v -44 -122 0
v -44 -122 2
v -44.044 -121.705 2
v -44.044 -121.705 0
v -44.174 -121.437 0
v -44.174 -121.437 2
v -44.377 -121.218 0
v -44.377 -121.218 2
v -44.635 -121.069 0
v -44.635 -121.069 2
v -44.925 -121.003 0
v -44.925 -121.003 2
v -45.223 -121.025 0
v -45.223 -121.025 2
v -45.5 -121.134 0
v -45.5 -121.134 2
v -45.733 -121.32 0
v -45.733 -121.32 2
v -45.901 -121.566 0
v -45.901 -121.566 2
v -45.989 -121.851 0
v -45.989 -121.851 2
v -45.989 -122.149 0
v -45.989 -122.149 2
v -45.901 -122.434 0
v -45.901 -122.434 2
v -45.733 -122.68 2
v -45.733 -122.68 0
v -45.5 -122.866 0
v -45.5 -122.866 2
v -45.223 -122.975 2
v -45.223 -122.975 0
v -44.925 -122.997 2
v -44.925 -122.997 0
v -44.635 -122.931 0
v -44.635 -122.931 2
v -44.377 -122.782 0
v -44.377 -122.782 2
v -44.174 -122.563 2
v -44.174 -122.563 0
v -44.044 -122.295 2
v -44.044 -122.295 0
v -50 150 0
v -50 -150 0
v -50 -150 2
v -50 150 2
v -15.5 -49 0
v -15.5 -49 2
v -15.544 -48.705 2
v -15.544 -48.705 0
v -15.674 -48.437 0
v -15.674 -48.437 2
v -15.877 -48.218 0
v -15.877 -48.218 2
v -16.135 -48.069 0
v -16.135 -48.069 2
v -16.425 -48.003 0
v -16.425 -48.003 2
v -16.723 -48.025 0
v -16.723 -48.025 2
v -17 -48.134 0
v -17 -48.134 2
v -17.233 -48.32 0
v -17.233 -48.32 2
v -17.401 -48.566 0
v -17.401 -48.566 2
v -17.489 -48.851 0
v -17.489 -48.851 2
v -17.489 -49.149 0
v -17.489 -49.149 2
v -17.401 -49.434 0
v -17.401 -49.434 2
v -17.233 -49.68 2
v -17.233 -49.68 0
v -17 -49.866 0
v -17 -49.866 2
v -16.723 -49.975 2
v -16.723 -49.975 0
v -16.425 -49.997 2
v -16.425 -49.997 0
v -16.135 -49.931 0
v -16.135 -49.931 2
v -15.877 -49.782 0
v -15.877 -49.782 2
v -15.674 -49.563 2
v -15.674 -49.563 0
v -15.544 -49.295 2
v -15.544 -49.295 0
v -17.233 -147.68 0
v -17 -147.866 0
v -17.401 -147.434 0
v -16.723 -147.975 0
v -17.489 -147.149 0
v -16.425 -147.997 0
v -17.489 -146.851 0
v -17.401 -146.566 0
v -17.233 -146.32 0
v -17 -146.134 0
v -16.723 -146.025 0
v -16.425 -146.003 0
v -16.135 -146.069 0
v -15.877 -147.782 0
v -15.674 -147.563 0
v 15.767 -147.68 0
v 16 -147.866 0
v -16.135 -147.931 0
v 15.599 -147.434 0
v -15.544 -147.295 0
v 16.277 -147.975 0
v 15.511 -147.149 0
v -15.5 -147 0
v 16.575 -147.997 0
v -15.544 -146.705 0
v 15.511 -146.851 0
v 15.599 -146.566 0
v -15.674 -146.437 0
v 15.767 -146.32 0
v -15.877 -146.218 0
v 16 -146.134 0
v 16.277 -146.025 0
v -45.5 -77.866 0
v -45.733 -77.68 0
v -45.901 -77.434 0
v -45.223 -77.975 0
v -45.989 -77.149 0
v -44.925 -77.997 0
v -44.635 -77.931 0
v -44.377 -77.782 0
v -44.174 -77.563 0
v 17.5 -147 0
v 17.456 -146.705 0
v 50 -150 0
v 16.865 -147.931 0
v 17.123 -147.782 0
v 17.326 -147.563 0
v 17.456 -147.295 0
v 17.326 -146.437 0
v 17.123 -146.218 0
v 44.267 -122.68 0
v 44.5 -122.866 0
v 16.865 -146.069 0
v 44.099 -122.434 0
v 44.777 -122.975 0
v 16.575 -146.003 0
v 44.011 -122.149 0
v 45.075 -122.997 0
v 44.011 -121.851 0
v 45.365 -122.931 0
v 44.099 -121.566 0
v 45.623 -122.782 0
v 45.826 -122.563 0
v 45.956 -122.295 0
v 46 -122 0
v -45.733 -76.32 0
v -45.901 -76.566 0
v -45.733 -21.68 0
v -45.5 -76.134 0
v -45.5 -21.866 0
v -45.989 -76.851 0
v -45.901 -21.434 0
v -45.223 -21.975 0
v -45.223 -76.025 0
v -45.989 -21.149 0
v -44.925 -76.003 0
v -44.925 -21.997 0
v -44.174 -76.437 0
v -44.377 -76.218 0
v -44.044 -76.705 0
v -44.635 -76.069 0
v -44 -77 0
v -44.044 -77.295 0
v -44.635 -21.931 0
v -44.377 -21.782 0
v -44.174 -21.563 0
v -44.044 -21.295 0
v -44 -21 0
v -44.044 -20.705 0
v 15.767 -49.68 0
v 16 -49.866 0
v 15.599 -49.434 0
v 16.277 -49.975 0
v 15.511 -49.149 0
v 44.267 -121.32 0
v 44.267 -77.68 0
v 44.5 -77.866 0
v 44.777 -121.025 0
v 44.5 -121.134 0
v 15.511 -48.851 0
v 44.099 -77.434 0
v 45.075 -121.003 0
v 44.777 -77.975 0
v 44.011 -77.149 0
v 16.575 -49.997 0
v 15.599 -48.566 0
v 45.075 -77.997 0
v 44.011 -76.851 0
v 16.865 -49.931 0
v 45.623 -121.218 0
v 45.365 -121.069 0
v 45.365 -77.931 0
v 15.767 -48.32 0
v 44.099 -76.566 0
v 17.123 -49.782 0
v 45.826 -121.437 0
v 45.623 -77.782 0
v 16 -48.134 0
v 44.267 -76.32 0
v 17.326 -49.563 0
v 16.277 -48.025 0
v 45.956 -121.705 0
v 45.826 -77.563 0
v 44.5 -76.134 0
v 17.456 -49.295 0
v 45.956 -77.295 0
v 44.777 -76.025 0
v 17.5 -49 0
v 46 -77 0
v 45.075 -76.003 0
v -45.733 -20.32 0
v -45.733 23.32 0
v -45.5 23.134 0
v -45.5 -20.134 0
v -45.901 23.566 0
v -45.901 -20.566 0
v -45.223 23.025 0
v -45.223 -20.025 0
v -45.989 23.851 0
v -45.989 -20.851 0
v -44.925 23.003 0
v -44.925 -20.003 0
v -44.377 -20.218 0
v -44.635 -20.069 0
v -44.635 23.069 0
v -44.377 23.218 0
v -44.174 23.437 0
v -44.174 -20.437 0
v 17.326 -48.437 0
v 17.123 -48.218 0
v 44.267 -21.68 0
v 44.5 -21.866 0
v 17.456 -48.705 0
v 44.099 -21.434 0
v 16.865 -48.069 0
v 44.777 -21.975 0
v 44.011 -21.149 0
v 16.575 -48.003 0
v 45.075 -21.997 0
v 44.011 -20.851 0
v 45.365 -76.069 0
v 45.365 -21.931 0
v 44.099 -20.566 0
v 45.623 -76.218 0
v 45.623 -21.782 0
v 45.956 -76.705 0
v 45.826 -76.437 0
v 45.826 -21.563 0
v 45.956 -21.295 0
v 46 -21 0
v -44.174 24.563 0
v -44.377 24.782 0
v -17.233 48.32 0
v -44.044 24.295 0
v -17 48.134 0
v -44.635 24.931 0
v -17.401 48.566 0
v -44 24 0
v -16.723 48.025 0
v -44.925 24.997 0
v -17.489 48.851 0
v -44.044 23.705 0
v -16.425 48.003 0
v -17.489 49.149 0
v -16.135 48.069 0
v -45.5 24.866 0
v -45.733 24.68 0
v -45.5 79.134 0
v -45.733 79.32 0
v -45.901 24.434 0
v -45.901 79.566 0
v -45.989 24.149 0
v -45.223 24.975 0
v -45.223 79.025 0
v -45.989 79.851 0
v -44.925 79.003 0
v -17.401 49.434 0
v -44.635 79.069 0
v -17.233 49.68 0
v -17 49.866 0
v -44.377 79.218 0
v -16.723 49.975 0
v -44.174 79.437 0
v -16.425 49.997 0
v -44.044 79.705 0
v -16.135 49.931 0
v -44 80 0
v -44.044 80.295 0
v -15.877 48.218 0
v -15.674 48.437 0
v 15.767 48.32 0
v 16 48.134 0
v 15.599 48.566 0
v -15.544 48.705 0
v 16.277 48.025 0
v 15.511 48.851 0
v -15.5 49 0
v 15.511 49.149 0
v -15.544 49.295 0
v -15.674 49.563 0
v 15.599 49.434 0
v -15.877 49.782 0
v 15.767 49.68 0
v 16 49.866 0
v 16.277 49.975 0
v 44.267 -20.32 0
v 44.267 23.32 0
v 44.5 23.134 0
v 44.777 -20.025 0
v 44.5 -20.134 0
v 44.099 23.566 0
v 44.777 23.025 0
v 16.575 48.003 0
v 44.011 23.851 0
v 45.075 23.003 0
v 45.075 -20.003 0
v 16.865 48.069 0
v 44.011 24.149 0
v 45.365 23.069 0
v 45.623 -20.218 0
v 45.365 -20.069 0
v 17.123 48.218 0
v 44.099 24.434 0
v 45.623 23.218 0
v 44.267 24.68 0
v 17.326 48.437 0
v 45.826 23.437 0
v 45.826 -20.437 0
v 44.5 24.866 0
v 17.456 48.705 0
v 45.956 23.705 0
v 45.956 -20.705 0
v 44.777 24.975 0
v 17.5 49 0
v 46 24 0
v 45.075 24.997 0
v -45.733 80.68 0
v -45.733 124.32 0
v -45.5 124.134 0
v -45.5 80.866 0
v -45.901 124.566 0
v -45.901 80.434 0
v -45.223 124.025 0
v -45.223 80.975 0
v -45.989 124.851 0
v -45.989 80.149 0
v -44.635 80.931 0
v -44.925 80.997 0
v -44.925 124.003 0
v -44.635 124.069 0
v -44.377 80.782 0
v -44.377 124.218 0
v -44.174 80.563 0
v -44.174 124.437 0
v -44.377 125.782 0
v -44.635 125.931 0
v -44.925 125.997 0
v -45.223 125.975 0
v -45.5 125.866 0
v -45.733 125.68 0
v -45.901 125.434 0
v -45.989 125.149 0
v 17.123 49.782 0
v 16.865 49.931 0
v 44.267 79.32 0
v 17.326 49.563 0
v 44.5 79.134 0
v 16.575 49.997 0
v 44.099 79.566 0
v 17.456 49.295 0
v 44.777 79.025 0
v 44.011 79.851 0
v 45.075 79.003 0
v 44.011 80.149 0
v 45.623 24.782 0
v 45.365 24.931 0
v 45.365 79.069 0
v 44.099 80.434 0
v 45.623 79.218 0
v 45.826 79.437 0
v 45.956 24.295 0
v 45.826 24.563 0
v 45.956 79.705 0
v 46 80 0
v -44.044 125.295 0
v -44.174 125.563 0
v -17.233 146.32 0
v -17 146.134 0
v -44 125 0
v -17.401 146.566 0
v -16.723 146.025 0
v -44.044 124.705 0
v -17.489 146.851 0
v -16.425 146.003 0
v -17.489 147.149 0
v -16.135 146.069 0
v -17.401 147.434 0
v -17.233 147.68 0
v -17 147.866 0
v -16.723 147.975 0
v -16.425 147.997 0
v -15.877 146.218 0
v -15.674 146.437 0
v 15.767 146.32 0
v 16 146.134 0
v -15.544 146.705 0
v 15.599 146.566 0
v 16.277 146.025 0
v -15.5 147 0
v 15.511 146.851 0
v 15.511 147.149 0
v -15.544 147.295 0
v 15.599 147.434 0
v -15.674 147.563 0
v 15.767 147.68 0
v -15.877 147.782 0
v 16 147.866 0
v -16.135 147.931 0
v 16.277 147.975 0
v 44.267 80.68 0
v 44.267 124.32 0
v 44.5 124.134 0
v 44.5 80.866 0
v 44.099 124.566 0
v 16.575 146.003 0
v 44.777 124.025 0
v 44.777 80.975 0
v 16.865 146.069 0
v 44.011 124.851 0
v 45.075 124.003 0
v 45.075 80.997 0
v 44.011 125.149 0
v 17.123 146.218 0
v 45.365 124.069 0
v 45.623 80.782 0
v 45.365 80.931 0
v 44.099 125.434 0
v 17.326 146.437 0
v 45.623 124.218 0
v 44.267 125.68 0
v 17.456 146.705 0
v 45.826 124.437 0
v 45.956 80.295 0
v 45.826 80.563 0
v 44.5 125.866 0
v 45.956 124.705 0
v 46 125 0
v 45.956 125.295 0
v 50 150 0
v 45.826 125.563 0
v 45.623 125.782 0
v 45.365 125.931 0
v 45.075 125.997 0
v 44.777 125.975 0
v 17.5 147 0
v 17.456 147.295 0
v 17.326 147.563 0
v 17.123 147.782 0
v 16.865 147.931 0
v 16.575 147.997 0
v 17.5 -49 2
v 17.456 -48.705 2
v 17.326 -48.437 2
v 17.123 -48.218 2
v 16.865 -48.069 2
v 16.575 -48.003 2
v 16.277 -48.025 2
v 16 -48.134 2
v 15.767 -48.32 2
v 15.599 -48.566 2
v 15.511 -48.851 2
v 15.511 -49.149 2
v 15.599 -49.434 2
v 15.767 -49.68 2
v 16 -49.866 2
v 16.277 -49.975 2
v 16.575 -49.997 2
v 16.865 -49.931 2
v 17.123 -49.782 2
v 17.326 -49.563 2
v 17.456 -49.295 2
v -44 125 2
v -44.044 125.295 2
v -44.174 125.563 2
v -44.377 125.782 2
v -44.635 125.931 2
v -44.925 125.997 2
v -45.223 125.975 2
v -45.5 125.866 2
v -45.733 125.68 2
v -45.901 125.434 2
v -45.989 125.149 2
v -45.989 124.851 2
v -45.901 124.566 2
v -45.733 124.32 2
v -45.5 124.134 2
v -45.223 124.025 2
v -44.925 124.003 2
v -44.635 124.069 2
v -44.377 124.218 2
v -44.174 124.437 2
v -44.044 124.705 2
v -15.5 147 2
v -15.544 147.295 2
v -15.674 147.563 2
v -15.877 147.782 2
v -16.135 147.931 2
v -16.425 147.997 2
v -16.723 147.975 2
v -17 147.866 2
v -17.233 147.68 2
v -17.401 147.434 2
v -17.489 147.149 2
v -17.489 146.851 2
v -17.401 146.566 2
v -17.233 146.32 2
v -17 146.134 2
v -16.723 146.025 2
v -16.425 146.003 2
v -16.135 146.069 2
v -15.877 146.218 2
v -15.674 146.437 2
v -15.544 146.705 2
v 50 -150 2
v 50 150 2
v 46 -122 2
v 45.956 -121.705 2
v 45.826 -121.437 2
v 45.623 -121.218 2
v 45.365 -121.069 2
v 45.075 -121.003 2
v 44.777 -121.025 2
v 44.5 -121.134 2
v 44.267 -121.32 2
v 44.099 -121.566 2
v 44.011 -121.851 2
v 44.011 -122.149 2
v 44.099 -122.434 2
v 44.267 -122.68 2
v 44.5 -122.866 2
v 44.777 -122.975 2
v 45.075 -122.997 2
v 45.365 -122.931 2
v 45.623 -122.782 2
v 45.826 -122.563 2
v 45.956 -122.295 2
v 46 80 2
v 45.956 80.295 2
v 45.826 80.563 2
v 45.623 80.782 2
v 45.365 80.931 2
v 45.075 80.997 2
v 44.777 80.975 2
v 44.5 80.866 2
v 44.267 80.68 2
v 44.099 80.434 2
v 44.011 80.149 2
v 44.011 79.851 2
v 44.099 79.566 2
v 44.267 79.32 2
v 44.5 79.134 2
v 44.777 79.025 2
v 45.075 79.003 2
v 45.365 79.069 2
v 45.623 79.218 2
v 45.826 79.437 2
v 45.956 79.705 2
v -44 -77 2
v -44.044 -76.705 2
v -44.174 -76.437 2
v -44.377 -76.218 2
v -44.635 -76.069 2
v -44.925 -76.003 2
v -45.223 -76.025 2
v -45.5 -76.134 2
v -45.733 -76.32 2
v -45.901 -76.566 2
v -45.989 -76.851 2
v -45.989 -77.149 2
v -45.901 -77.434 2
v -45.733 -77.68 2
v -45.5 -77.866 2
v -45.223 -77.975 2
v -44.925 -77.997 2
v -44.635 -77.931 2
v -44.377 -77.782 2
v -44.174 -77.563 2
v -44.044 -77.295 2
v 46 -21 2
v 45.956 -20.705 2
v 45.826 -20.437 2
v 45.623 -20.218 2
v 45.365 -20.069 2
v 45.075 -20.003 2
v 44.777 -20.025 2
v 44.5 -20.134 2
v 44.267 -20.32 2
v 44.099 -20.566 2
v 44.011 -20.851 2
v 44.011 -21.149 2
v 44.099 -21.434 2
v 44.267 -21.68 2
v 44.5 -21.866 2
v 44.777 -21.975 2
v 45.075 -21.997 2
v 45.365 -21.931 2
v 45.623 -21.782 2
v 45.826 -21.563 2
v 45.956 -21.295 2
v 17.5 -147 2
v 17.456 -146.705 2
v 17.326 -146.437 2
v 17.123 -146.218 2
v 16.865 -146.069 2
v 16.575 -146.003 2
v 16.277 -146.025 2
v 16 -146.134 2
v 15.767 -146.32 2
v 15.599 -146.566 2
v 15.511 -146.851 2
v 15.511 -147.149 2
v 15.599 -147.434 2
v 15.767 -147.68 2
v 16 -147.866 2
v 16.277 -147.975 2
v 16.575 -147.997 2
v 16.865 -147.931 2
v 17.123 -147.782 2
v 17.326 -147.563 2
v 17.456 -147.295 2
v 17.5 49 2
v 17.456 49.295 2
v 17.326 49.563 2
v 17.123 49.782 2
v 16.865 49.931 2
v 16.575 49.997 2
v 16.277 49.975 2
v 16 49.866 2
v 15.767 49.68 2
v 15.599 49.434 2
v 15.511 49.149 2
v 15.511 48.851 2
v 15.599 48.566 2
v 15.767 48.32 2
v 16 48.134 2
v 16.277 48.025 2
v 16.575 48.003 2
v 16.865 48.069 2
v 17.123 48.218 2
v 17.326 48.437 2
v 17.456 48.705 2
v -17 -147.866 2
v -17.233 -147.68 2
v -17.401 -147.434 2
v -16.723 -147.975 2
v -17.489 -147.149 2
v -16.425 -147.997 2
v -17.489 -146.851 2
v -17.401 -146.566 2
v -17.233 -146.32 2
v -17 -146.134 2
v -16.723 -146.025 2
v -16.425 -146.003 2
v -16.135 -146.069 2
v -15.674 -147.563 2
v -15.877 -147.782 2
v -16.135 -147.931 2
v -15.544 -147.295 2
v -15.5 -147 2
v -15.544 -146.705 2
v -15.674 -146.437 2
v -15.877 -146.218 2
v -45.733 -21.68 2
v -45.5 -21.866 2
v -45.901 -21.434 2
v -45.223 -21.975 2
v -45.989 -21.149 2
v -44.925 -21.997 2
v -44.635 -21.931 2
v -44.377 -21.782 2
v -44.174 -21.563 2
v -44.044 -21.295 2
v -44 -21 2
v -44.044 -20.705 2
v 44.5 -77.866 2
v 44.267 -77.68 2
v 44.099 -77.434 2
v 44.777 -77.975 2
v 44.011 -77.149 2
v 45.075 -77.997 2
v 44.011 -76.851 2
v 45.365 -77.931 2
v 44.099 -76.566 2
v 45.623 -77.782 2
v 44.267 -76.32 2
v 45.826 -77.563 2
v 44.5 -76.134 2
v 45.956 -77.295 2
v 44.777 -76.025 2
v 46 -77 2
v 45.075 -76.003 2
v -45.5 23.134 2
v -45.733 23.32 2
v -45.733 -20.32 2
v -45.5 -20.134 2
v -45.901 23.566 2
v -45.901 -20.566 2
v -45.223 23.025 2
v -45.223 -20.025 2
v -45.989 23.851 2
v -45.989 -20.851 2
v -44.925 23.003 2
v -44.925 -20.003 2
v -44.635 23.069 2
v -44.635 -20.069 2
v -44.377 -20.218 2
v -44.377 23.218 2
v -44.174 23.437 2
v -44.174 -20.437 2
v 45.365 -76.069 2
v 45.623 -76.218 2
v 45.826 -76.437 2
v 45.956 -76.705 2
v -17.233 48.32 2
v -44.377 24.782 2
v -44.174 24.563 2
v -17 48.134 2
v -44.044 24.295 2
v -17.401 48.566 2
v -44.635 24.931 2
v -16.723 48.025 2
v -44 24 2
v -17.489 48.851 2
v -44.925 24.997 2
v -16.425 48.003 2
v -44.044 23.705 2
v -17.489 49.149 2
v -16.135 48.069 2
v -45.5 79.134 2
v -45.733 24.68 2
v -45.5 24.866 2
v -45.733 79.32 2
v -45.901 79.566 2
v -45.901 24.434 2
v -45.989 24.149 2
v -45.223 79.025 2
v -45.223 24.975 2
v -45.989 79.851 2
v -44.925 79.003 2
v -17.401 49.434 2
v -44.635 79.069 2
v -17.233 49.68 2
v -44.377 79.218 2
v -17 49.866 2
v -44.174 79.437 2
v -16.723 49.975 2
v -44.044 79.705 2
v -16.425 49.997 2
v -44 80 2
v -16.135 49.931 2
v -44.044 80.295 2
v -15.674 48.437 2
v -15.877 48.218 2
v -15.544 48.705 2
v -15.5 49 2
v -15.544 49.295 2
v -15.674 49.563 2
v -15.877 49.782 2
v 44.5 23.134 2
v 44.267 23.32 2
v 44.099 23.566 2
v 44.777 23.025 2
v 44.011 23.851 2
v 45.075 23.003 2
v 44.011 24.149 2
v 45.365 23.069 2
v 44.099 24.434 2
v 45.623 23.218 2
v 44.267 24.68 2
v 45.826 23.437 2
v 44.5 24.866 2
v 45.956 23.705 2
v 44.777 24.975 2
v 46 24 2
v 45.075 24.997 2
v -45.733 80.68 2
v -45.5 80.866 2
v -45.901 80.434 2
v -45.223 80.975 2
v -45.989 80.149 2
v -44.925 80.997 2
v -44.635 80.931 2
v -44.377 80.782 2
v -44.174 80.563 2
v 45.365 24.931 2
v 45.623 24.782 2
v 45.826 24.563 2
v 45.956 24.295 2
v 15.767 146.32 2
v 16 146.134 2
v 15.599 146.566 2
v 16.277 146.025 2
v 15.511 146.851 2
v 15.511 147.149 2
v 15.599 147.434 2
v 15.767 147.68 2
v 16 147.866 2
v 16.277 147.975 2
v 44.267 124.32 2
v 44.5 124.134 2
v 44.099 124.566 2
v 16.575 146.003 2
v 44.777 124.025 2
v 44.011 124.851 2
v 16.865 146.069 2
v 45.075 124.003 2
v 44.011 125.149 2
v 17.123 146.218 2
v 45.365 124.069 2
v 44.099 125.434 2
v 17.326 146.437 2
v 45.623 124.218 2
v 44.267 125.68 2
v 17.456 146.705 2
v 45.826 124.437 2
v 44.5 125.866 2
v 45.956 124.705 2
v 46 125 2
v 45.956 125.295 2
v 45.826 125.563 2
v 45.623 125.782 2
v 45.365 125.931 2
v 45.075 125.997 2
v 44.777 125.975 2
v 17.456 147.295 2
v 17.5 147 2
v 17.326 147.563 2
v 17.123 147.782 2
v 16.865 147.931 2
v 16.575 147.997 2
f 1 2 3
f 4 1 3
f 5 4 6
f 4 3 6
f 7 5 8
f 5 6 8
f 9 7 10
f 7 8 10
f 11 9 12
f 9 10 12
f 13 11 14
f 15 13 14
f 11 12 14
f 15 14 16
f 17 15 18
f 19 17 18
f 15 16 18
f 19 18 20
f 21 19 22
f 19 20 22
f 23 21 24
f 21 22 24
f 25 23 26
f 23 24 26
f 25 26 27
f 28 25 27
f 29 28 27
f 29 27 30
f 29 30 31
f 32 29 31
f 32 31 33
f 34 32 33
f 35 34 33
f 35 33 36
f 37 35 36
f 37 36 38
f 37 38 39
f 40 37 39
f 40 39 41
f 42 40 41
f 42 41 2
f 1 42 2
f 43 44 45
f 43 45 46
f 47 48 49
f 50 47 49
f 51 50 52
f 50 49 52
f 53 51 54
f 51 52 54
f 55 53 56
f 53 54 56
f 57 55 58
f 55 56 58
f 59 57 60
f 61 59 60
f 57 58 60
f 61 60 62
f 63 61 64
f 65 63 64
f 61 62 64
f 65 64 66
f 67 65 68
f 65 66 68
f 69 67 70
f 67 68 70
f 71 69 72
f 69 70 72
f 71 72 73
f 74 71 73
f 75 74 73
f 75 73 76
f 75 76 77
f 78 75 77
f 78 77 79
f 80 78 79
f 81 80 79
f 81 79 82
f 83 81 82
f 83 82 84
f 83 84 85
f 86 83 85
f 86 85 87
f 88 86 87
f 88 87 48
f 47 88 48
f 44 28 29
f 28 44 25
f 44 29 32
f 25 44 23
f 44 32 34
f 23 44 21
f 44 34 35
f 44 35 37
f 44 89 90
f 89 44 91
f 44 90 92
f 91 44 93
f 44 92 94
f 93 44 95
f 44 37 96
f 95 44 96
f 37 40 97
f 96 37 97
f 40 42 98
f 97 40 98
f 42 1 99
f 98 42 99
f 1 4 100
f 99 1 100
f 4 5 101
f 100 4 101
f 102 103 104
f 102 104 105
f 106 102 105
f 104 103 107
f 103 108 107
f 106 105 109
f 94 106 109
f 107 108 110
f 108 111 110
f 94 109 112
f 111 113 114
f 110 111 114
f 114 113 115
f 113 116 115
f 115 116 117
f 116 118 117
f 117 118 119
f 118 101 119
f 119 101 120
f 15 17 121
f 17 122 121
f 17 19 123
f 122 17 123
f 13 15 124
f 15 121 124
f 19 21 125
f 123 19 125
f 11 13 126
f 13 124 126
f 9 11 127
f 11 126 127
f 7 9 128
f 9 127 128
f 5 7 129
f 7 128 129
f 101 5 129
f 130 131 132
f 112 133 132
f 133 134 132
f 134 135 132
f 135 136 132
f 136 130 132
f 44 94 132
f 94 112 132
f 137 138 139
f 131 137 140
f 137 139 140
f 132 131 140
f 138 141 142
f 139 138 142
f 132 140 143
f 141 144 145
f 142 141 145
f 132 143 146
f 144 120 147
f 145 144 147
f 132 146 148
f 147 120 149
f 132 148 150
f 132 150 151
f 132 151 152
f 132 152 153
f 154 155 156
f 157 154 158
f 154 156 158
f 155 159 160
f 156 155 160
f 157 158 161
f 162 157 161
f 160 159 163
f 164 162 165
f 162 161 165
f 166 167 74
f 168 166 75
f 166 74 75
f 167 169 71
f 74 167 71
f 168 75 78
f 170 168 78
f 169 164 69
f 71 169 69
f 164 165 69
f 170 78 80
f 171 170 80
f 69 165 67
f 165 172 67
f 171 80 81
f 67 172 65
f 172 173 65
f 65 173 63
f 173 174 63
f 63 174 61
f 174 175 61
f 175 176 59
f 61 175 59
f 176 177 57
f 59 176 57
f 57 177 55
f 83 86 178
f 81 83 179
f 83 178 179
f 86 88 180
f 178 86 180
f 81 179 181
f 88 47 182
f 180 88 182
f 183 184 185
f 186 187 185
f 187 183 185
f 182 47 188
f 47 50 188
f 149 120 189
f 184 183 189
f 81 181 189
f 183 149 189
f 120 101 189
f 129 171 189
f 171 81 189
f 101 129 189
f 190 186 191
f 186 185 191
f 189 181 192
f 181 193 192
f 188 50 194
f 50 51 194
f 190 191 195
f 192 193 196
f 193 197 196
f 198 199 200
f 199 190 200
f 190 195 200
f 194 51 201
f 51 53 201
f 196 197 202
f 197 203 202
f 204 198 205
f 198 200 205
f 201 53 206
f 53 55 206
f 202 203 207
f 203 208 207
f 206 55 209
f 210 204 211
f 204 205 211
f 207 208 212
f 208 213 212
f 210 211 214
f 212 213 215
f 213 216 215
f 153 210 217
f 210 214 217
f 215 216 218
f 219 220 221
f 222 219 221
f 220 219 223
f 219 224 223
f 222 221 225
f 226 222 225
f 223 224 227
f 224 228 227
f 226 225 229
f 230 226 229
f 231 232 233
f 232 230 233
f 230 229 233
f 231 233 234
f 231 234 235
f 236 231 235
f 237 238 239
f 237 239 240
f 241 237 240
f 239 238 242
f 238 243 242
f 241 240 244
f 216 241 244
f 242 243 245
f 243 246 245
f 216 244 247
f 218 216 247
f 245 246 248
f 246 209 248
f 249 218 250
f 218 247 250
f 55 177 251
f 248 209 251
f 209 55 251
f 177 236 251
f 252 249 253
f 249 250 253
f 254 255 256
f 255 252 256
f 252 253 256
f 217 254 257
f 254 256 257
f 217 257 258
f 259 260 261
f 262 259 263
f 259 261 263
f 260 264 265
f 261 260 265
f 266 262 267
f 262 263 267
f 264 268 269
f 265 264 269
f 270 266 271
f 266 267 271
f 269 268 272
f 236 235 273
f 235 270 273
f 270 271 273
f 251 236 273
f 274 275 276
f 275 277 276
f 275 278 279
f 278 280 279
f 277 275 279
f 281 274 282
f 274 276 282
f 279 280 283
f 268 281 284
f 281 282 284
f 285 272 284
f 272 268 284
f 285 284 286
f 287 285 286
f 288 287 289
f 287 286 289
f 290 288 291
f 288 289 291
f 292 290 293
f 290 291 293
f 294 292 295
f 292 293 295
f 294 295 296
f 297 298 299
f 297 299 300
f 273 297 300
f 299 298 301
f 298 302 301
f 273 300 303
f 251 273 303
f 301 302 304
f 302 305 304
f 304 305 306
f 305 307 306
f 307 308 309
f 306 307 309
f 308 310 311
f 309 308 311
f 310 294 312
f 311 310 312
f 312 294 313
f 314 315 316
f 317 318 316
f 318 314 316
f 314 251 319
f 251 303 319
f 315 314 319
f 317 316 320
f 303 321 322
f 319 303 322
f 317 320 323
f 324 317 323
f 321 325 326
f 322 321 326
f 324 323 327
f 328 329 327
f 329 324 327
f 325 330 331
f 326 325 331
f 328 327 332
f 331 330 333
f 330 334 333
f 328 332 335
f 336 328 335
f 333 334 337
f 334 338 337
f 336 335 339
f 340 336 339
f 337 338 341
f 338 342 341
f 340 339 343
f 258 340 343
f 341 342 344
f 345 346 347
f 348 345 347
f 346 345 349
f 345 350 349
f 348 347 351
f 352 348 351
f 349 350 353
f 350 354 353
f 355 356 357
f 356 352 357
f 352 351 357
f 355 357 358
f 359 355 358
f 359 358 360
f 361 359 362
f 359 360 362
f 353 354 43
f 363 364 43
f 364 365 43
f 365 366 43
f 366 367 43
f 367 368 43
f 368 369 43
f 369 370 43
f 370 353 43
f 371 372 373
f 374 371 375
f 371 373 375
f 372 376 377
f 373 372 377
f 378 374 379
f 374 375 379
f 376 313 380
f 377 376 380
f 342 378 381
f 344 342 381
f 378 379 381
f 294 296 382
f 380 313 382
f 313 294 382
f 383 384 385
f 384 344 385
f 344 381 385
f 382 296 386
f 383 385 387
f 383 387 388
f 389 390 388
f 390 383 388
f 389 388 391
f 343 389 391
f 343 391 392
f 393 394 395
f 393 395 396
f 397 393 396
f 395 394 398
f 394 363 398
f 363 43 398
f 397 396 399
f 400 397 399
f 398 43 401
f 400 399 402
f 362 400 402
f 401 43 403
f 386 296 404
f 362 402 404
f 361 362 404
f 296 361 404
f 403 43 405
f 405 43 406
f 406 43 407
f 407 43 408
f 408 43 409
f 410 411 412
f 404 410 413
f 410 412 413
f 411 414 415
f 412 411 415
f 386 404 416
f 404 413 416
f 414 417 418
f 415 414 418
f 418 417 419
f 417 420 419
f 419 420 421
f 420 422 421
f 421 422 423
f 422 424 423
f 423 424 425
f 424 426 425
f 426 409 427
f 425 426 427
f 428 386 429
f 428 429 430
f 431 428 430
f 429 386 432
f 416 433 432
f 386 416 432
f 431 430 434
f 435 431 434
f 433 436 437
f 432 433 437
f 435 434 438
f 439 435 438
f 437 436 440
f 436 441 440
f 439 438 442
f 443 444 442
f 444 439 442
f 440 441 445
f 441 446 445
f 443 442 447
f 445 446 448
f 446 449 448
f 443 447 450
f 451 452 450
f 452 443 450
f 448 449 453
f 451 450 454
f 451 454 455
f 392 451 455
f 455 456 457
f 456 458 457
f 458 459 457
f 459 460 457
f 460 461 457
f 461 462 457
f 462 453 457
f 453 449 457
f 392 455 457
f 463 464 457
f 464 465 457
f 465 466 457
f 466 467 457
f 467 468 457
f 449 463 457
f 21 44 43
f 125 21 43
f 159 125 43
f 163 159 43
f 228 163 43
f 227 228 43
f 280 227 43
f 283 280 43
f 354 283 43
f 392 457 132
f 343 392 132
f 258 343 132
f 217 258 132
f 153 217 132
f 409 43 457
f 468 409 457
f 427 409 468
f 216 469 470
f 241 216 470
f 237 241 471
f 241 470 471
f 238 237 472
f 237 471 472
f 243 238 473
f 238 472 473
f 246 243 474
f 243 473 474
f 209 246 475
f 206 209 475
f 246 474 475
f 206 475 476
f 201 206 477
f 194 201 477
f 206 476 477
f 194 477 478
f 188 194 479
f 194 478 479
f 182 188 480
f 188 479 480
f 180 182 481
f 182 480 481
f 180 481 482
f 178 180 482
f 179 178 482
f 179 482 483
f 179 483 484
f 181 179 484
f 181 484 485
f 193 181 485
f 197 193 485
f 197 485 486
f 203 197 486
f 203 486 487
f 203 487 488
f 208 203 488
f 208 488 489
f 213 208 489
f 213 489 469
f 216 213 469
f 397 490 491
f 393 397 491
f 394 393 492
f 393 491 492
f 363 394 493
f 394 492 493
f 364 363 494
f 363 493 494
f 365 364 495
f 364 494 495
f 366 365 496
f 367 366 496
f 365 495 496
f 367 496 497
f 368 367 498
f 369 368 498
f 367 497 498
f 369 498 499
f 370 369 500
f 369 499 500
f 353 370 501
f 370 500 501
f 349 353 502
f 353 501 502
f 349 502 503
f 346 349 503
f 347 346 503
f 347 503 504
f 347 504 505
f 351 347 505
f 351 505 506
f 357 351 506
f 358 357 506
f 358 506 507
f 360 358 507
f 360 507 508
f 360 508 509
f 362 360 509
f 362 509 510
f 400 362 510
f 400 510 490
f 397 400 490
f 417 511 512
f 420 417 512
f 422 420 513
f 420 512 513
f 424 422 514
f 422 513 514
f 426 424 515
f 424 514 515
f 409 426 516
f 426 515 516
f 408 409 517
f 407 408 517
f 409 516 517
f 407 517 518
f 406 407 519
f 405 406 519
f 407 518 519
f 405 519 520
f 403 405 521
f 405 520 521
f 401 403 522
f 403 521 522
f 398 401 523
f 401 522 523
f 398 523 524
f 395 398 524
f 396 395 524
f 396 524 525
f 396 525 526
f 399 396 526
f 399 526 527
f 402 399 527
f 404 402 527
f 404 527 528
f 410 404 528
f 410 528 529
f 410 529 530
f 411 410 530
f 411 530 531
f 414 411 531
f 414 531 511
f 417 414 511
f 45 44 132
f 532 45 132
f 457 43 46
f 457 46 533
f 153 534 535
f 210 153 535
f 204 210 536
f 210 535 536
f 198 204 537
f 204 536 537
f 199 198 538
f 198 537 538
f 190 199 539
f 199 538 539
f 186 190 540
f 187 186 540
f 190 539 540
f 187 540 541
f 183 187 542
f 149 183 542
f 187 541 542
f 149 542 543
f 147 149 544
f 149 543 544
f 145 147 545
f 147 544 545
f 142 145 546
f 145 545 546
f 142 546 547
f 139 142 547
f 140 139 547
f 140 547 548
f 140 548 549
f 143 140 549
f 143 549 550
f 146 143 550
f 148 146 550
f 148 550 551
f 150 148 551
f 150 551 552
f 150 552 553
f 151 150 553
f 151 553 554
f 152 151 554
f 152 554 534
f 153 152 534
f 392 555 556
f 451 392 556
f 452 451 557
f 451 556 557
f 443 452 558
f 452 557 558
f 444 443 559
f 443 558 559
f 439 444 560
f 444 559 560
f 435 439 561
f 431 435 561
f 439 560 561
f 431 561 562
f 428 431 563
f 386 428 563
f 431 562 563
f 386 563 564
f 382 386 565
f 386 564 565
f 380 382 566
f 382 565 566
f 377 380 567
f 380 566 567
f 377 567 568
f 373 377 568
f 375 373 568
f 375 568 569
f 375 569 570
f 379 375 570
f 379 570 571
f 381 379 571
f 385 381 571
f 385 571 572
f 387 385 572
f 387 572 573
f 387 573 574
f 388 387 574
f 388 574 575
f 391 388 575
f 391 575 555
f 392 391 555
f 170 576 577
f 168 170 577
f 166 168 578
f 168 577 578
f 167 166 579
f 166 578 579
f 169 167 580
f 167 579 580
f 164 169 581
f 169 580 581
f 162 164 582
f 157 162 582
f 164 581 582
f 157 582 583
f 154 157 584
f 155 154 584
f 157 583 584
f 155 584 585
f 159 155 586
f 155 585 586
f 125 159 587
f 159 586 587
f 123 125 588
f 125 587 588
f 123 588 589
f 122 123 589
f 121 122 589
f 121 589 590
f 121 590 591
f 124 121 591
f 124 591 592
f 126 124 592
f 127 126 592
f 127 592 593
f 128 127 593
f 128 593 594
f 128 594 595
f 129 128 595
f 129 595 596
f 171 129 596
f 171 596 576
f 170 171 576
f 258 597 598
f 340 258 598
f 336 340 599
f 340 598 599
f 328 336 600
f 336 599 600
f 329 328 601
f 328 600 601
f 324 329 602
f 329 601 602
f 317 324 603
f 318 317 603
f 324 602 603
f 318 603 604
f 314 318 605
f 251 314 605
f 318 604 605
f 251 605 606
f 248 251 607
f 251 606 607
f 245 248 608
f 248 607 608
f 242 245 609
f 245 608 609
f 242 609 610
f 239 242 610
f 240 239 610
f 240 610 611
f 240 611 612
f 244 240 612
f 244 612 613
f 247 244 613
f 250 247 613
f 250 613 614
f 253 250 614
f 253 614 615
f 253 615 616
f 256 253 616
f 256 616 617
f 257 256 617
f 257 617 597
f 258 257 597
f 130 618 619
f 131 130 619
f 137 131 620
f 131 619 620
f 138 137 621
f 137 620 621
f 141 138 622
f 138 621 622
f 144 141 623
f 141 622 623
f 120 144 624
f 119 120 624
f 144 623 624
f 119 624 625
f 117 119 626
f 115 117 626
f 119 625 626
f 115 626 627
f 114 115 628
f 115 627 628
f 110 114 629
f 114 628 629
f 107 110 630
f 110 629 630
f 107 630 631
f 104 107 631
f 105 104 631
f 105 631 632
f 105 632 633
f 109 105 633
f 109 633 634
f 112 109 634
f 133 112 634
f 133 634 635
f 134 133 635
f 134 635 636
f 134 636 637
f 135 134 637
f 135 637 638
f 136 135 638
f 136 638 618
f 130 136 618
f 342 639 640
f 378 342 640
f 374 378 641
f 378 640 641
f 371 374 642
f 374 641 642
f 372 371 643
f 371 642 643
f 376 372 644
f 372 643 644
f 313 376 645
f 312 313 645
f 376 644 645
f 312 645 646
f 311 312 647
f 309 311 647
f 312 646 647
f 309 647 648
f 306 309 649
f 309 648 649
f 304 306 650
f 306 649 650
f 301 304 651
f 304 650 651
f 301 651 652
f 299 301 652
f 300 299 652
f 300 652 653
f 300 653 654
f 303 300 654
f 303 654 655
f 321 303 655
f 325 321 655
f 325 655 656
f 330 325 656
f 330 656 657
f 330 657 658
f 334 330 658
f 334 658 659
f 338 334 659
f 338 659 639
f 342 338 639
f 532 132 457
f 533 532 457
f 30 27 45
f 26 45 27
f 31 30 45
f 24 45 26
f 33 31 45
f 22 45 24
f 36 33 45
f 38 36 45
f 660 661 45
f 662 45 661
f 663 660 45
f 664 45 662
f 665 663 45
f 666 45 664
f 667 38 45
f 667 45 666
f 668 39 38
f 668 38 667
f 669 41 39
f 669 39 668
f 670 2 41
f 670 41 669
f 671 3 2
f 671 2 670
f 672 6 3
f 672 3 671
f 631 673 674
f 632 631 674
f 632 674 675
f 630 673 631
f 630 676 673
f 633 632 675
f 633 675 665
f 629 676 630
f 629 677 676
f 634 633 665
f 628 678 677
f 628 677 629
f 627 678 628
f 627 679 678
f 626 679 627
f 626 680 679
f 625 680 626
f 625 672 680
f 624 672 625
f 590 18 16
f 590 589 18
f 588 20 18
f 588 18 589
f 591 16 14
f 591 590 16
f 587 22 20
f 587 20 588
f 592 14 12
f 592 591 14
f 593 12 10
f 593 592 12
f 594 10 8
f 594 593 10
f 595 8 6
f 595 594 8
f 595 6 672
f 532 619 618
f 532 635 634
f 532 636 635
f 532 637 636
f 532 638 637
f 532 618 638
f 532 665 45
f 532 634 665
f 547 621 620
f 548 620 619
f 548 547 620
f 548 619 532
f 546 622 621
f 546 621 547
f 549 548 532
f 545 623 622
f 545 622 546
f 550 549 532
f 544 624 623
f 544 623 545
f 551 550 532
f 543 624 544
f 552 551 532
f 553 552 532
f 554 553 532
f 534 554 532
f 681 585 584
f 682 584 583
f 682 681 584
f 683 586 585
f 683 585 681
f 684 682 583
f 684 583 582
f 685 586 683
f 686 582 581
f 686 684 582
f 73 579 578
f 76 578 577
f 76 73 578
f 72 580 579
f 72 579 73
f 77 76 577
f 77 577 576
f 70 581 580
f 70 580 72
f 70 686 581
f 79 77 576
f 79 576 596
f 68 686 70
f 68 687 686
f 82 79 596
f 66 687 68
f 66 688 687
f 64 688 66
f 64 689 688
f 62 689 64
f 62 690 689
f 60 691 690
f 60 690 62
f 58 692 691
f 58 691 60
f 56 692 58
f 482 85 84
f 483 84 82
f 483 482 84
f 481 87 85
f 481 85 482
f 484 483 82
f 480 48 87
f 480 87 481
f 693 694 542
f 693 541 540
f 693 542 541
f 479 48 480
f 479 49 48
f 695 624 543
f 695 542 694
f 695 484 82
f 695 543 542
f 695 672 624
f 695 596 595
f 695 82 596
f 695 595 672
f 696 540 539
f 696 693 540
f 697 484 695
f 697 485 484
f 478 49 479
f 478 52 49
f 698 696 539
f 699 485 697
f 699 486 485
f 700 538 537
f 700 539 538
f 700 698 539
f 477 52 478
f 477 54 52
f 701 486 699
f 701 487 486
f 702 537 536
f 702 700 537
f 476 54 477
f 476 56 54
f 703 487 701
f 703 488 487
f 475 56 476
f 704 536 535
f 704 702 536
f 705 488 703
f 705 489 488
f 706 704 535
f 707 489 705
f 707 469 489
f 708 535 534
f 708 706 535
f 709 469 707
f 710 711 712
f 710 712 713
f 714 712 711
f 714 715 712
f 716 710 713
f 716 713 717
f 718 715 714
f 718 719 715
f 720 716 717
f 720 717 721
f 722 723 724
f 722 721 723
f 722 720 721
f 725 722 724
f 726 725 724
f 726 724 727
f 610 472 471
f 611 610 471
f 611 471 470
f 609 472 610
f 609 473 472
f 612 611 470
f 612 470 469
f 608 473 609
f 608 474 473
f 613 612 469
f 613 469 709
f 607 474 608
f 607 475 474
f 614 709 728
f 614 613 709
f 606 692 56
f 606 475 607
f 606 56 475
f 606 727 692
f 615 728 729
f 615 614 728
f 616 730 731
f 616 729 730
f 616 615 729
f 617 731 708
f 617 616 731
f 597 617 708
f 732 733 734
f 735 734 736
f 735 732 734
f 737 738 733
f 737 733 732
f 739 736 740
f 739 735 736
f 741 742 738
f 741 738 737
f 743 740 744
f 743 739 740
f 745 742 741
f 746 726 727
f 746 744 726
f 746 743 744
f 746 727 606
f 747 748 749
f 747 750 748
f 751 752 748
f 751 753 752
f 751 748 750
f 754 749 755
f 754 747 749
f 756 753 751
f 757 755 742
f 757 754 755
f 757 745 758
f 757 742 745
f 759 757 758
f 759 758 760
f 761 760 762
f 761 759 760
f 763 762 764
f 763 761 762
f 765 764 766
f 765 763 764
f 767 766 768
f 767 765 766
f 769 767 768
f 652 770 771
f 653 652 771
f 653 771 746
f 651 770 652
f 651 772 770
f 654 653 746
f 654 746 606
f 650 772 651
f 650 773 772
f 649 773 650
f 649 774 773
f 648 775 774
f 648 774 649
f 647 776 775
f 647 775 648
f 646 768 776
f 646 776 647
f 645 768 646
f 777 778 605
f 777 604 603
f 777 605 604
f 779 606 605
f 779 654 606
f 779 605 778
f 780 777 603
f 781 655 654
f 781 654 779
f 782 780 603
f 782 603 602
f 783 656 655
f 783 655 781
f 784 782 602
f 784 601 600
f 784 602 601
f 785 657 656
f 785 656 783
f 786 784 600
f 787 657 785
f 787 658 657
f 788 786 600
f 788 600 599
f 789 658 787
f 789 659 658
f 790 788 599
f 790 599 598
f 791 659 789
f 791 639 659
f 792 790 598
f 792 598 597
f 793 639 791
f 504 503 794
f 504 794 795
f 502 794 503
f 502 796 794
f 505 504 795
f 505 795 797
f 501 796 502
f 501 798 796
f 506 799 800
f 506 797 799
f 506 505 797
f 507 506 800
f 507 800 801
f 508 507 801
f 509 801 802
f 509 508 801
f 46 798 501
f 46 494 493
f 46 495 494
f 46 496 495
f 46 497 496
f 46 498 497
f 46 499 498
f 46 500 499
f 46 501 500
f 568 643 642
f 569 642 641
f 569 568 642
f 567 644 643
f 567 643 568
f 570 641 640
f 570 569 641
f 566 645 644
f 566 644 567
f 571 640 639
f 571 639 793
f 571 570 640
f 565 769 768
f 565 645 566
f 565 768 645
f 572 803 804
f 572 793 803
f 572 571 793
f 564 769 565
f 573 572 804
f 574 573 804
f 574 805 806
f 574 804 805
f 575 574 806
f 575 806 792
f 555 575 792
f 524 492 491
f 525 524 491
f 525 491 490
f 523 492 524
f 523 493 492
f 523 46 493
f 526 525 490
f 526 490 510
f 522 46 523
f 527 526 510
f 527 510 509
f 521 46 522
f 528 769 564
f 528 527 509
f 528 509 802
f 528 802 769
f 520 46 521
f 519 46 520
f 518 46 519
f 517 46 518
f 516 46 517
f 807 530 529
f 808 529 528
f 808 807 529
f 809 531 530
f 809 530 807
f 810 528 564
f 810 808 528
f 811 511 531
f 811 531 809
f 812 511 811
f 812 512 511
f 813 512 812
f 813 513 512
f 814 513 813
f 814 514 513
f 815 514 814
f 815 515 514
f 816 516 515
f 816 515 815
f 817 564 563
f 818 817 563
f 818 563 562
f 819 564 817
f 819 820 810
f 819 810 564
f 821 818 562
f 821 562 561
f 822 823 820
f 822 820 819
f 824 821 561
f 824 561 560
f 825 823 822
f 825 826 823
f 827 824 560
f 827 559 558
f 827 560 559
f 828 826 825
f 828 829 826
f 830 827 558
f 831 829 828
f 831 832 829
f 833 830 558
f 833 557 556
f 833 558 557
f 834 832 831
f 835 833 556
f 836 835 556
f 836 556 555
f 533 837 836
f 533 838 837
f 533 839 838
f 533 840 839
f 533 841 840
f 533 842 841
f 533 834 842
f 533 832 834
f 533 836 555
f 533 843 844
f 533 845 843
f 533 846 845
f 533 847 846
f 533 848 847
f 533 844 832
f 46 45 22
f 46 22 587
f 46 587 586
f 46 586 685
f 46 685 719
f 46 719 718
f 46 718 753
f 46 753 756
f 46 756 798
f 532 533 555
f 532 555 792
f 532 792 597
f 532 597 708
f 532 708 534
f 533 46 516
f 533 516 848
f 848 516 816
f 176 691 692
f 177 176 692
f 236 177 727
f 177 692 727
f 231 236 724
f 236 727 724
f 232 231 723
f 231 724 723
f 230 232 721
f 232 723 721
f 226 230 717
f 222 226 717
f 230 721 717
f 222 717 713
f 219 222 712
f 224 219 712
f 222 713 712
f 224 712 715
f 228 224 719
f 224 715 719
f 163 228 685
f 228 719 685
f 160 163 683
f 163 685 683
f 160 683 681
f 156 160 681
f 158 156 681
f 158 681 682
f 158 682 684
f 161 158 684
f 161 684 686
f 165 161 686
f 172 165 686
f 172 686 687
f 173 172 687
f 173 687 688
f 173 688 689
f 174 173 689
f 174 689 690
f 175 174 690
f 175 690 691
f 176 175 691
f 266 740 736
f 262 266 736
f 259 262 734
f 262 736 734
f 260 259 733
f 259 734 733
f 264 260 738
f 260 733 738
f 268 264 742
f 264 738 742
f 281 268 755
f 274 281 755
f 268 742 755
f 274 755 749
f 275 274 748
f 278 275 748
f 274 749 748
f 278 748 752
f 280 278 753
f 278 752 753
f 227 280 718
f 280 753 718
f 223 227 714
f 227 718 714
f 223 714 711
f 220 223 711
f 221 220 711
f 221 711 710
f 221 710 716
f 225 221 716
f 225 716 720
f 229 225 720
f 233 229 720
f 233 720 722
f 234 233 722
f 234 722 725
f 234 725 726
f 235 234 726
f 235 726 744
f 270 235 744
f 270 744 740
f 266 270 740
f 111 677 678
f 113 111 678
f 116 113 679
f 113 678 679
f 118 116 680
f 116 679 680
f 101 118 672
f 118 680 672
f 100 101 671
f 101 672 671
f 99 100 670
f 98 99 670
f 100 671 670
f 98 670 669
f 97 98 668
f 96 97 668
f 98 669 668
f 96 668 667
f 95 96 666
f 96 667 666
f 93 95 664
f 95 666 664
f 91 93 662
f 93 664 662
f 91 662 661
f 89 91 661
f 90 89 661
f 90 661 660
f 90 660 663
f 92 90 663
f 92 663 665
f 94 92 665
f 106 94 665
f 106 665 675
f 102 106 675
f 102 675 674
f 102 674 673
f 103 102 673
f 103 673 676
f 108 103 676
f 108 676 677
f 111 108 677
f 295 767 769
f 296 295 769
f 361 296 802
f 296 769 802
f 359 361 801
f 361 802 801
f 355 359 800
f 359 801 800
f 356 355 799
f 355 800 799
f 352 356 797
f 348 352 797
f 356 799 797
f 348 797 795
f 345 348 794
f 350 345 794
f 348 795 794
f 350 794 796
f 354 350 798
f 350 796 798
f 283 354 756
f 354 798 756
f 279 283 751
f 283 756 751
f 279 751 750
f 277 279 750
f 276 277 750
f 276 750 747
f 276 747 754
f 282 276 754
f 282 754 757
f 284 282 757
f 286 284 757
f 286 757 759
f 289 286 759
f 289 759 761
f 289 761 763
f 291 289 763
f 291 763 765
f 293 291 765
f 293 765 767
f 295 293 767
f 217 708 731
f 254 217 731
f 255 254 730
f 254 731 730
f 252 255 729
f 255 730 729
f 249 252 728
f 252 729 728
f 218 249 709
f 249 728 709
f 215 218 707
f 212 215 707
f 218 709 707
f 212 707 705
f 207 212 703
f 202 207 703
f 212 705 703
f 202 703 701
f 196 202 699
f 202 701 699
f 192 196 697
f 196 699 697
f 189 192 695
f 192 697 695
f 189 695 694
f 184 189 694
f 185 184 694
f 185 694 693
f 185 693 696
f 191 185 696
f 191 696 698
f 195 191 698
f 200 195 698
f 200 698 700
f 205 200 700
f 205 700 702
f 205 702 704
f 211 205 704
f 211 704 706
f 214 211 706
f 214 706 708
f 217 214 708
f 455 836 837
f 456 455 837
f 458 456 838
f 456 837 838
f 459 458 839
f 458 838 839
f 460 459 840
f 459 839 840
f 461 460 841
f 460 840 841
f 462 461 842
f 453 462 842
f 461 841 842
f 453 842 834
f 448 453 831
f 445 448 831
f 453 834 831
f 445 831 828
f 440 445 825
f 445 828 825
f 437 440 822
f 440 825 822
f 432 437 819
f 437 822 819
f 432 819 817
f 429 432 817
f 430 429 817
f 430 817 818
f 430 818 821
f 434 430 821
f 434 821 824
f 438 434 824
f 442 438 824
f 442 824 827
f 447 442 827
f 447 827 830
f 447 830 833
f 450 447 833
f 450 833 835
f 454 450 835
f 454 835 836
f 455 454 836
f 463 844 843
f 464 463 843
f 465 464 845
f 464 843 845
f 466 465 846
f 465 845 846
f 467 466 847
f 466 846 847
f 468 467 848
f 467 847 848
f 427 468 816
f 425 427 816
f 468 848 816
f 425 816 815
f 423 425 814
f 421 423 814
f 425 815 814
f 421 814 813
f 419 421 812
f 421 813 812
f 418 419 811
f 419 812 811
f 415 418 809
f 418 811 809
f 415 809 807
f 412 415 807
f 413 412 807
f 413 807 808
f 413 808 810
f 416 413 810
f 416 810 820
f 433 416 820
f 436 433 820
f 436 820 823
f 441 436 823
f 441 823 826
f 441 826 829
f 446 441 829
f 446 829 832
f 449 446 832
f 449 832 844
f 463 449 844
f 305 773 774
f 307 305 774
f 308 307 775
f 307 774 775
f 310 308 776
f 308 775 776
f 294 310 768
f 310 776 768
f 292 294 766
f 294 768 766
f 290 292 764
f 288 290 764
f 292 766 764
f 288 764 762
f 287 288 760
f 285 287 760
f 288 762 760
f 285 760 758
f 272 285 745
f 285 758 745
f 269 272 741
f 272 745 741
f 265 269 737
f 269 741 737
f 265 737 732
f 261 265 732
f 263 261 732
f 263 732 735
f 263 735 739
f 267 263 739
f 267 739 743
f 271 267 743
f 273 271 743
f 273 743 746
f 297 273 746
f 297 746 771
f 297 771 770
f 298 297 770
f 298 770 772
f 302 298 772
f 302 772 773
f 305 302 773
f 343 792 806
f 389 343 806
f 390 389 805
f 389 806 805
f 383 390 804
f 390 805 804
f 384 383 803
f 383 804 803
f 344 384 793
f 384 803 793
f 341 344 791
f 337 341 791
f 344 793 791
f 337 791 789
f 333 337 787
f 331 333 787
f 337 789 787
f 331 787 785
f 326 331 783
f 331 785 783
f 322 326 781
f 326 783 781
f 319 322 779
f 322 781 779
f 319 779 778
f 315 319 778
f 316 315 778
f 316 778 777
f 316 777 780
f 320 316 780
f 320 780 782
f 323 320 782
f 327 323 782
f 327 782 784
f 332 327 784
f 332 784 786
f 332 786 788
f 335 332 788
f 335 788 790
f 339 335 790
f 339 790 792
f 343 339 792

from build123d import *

# Parameters (mm, degrees)
SKETCH1_W           = 100
SKETCH1_H           = 300
BOSS_EXTRUDE1_DEPTH = 2
SKETCH2_R           = 1
CUT_EXTRUDE1_DEPTH  = 25


with BuildPart() as part:
    # Sketch1 → Boss-Extrude1 (new body)
    with BuildSketch(Plane.XY):
        Rectangle(SKETCH1_W, SKETCH1_H)
    extrude(amount=BOSS_EXTRUDE1_DEPTH)

    # Sketch2 → Cut-Extrude1 (cut)
    with BuildSketch(Plane.XY.offset(2)):
        with Locations((-45, 125)):
            Circle(SKETCH2_R)
        with Locations((-45, 80)):
            Circle(SKETCH2_R)
        with Locations((45, 125)):
            Circle(SKETCH2_R)
        with Locations((45, 80)):
            Circle(SKETCH2_R)
        with Locations((-45, 24)):
            Circle(SKETCH2_R)
        with Locations((-45, -21)):
            Circle(SKETCH2_R)
        with Locations((45, 24)):
            Circle(SKETCH2_R)
        with Locations((45, -21)):
            Circle(SKETCH2_R)
        with Locations((-45, -77)):
            Circle(SKETCH2_R)
        with Locations((-45, -122)):
            Circle(SKETCH2_R)
        with Locations((45, -77)):
            Circle(SKETCH2_R)
        with Locations((45, -122)):
            Circle(SKETCH2_R)
        with Locations((16.5, -147)):
            Circle(SKETCH2_R)
        with Locations((-16.5, -147)):
            Circle(SKETCH2_R)
        with Locations((-16.5, -49)):
            Circle(SKETCH2_R)
        with Locations((16.5, -49)):
            Circle(SKETCH2_R)
        with Locations((-16.5, 49)):
            Circle(SKETCH2_R)
        with Locations((16.5, 49)):
            Circle(SKETCH2_R)
        with Locations((-16.5, 147)):
            Circle(SKETCH2_R)
        with Locations((16.5, 147)):
            Circle(SKETCH2_R)
    extrude(amount=-CUT_EXTRUDE1_DEPTH, mode=Mode.SUBTRACT)


solid = part.part
